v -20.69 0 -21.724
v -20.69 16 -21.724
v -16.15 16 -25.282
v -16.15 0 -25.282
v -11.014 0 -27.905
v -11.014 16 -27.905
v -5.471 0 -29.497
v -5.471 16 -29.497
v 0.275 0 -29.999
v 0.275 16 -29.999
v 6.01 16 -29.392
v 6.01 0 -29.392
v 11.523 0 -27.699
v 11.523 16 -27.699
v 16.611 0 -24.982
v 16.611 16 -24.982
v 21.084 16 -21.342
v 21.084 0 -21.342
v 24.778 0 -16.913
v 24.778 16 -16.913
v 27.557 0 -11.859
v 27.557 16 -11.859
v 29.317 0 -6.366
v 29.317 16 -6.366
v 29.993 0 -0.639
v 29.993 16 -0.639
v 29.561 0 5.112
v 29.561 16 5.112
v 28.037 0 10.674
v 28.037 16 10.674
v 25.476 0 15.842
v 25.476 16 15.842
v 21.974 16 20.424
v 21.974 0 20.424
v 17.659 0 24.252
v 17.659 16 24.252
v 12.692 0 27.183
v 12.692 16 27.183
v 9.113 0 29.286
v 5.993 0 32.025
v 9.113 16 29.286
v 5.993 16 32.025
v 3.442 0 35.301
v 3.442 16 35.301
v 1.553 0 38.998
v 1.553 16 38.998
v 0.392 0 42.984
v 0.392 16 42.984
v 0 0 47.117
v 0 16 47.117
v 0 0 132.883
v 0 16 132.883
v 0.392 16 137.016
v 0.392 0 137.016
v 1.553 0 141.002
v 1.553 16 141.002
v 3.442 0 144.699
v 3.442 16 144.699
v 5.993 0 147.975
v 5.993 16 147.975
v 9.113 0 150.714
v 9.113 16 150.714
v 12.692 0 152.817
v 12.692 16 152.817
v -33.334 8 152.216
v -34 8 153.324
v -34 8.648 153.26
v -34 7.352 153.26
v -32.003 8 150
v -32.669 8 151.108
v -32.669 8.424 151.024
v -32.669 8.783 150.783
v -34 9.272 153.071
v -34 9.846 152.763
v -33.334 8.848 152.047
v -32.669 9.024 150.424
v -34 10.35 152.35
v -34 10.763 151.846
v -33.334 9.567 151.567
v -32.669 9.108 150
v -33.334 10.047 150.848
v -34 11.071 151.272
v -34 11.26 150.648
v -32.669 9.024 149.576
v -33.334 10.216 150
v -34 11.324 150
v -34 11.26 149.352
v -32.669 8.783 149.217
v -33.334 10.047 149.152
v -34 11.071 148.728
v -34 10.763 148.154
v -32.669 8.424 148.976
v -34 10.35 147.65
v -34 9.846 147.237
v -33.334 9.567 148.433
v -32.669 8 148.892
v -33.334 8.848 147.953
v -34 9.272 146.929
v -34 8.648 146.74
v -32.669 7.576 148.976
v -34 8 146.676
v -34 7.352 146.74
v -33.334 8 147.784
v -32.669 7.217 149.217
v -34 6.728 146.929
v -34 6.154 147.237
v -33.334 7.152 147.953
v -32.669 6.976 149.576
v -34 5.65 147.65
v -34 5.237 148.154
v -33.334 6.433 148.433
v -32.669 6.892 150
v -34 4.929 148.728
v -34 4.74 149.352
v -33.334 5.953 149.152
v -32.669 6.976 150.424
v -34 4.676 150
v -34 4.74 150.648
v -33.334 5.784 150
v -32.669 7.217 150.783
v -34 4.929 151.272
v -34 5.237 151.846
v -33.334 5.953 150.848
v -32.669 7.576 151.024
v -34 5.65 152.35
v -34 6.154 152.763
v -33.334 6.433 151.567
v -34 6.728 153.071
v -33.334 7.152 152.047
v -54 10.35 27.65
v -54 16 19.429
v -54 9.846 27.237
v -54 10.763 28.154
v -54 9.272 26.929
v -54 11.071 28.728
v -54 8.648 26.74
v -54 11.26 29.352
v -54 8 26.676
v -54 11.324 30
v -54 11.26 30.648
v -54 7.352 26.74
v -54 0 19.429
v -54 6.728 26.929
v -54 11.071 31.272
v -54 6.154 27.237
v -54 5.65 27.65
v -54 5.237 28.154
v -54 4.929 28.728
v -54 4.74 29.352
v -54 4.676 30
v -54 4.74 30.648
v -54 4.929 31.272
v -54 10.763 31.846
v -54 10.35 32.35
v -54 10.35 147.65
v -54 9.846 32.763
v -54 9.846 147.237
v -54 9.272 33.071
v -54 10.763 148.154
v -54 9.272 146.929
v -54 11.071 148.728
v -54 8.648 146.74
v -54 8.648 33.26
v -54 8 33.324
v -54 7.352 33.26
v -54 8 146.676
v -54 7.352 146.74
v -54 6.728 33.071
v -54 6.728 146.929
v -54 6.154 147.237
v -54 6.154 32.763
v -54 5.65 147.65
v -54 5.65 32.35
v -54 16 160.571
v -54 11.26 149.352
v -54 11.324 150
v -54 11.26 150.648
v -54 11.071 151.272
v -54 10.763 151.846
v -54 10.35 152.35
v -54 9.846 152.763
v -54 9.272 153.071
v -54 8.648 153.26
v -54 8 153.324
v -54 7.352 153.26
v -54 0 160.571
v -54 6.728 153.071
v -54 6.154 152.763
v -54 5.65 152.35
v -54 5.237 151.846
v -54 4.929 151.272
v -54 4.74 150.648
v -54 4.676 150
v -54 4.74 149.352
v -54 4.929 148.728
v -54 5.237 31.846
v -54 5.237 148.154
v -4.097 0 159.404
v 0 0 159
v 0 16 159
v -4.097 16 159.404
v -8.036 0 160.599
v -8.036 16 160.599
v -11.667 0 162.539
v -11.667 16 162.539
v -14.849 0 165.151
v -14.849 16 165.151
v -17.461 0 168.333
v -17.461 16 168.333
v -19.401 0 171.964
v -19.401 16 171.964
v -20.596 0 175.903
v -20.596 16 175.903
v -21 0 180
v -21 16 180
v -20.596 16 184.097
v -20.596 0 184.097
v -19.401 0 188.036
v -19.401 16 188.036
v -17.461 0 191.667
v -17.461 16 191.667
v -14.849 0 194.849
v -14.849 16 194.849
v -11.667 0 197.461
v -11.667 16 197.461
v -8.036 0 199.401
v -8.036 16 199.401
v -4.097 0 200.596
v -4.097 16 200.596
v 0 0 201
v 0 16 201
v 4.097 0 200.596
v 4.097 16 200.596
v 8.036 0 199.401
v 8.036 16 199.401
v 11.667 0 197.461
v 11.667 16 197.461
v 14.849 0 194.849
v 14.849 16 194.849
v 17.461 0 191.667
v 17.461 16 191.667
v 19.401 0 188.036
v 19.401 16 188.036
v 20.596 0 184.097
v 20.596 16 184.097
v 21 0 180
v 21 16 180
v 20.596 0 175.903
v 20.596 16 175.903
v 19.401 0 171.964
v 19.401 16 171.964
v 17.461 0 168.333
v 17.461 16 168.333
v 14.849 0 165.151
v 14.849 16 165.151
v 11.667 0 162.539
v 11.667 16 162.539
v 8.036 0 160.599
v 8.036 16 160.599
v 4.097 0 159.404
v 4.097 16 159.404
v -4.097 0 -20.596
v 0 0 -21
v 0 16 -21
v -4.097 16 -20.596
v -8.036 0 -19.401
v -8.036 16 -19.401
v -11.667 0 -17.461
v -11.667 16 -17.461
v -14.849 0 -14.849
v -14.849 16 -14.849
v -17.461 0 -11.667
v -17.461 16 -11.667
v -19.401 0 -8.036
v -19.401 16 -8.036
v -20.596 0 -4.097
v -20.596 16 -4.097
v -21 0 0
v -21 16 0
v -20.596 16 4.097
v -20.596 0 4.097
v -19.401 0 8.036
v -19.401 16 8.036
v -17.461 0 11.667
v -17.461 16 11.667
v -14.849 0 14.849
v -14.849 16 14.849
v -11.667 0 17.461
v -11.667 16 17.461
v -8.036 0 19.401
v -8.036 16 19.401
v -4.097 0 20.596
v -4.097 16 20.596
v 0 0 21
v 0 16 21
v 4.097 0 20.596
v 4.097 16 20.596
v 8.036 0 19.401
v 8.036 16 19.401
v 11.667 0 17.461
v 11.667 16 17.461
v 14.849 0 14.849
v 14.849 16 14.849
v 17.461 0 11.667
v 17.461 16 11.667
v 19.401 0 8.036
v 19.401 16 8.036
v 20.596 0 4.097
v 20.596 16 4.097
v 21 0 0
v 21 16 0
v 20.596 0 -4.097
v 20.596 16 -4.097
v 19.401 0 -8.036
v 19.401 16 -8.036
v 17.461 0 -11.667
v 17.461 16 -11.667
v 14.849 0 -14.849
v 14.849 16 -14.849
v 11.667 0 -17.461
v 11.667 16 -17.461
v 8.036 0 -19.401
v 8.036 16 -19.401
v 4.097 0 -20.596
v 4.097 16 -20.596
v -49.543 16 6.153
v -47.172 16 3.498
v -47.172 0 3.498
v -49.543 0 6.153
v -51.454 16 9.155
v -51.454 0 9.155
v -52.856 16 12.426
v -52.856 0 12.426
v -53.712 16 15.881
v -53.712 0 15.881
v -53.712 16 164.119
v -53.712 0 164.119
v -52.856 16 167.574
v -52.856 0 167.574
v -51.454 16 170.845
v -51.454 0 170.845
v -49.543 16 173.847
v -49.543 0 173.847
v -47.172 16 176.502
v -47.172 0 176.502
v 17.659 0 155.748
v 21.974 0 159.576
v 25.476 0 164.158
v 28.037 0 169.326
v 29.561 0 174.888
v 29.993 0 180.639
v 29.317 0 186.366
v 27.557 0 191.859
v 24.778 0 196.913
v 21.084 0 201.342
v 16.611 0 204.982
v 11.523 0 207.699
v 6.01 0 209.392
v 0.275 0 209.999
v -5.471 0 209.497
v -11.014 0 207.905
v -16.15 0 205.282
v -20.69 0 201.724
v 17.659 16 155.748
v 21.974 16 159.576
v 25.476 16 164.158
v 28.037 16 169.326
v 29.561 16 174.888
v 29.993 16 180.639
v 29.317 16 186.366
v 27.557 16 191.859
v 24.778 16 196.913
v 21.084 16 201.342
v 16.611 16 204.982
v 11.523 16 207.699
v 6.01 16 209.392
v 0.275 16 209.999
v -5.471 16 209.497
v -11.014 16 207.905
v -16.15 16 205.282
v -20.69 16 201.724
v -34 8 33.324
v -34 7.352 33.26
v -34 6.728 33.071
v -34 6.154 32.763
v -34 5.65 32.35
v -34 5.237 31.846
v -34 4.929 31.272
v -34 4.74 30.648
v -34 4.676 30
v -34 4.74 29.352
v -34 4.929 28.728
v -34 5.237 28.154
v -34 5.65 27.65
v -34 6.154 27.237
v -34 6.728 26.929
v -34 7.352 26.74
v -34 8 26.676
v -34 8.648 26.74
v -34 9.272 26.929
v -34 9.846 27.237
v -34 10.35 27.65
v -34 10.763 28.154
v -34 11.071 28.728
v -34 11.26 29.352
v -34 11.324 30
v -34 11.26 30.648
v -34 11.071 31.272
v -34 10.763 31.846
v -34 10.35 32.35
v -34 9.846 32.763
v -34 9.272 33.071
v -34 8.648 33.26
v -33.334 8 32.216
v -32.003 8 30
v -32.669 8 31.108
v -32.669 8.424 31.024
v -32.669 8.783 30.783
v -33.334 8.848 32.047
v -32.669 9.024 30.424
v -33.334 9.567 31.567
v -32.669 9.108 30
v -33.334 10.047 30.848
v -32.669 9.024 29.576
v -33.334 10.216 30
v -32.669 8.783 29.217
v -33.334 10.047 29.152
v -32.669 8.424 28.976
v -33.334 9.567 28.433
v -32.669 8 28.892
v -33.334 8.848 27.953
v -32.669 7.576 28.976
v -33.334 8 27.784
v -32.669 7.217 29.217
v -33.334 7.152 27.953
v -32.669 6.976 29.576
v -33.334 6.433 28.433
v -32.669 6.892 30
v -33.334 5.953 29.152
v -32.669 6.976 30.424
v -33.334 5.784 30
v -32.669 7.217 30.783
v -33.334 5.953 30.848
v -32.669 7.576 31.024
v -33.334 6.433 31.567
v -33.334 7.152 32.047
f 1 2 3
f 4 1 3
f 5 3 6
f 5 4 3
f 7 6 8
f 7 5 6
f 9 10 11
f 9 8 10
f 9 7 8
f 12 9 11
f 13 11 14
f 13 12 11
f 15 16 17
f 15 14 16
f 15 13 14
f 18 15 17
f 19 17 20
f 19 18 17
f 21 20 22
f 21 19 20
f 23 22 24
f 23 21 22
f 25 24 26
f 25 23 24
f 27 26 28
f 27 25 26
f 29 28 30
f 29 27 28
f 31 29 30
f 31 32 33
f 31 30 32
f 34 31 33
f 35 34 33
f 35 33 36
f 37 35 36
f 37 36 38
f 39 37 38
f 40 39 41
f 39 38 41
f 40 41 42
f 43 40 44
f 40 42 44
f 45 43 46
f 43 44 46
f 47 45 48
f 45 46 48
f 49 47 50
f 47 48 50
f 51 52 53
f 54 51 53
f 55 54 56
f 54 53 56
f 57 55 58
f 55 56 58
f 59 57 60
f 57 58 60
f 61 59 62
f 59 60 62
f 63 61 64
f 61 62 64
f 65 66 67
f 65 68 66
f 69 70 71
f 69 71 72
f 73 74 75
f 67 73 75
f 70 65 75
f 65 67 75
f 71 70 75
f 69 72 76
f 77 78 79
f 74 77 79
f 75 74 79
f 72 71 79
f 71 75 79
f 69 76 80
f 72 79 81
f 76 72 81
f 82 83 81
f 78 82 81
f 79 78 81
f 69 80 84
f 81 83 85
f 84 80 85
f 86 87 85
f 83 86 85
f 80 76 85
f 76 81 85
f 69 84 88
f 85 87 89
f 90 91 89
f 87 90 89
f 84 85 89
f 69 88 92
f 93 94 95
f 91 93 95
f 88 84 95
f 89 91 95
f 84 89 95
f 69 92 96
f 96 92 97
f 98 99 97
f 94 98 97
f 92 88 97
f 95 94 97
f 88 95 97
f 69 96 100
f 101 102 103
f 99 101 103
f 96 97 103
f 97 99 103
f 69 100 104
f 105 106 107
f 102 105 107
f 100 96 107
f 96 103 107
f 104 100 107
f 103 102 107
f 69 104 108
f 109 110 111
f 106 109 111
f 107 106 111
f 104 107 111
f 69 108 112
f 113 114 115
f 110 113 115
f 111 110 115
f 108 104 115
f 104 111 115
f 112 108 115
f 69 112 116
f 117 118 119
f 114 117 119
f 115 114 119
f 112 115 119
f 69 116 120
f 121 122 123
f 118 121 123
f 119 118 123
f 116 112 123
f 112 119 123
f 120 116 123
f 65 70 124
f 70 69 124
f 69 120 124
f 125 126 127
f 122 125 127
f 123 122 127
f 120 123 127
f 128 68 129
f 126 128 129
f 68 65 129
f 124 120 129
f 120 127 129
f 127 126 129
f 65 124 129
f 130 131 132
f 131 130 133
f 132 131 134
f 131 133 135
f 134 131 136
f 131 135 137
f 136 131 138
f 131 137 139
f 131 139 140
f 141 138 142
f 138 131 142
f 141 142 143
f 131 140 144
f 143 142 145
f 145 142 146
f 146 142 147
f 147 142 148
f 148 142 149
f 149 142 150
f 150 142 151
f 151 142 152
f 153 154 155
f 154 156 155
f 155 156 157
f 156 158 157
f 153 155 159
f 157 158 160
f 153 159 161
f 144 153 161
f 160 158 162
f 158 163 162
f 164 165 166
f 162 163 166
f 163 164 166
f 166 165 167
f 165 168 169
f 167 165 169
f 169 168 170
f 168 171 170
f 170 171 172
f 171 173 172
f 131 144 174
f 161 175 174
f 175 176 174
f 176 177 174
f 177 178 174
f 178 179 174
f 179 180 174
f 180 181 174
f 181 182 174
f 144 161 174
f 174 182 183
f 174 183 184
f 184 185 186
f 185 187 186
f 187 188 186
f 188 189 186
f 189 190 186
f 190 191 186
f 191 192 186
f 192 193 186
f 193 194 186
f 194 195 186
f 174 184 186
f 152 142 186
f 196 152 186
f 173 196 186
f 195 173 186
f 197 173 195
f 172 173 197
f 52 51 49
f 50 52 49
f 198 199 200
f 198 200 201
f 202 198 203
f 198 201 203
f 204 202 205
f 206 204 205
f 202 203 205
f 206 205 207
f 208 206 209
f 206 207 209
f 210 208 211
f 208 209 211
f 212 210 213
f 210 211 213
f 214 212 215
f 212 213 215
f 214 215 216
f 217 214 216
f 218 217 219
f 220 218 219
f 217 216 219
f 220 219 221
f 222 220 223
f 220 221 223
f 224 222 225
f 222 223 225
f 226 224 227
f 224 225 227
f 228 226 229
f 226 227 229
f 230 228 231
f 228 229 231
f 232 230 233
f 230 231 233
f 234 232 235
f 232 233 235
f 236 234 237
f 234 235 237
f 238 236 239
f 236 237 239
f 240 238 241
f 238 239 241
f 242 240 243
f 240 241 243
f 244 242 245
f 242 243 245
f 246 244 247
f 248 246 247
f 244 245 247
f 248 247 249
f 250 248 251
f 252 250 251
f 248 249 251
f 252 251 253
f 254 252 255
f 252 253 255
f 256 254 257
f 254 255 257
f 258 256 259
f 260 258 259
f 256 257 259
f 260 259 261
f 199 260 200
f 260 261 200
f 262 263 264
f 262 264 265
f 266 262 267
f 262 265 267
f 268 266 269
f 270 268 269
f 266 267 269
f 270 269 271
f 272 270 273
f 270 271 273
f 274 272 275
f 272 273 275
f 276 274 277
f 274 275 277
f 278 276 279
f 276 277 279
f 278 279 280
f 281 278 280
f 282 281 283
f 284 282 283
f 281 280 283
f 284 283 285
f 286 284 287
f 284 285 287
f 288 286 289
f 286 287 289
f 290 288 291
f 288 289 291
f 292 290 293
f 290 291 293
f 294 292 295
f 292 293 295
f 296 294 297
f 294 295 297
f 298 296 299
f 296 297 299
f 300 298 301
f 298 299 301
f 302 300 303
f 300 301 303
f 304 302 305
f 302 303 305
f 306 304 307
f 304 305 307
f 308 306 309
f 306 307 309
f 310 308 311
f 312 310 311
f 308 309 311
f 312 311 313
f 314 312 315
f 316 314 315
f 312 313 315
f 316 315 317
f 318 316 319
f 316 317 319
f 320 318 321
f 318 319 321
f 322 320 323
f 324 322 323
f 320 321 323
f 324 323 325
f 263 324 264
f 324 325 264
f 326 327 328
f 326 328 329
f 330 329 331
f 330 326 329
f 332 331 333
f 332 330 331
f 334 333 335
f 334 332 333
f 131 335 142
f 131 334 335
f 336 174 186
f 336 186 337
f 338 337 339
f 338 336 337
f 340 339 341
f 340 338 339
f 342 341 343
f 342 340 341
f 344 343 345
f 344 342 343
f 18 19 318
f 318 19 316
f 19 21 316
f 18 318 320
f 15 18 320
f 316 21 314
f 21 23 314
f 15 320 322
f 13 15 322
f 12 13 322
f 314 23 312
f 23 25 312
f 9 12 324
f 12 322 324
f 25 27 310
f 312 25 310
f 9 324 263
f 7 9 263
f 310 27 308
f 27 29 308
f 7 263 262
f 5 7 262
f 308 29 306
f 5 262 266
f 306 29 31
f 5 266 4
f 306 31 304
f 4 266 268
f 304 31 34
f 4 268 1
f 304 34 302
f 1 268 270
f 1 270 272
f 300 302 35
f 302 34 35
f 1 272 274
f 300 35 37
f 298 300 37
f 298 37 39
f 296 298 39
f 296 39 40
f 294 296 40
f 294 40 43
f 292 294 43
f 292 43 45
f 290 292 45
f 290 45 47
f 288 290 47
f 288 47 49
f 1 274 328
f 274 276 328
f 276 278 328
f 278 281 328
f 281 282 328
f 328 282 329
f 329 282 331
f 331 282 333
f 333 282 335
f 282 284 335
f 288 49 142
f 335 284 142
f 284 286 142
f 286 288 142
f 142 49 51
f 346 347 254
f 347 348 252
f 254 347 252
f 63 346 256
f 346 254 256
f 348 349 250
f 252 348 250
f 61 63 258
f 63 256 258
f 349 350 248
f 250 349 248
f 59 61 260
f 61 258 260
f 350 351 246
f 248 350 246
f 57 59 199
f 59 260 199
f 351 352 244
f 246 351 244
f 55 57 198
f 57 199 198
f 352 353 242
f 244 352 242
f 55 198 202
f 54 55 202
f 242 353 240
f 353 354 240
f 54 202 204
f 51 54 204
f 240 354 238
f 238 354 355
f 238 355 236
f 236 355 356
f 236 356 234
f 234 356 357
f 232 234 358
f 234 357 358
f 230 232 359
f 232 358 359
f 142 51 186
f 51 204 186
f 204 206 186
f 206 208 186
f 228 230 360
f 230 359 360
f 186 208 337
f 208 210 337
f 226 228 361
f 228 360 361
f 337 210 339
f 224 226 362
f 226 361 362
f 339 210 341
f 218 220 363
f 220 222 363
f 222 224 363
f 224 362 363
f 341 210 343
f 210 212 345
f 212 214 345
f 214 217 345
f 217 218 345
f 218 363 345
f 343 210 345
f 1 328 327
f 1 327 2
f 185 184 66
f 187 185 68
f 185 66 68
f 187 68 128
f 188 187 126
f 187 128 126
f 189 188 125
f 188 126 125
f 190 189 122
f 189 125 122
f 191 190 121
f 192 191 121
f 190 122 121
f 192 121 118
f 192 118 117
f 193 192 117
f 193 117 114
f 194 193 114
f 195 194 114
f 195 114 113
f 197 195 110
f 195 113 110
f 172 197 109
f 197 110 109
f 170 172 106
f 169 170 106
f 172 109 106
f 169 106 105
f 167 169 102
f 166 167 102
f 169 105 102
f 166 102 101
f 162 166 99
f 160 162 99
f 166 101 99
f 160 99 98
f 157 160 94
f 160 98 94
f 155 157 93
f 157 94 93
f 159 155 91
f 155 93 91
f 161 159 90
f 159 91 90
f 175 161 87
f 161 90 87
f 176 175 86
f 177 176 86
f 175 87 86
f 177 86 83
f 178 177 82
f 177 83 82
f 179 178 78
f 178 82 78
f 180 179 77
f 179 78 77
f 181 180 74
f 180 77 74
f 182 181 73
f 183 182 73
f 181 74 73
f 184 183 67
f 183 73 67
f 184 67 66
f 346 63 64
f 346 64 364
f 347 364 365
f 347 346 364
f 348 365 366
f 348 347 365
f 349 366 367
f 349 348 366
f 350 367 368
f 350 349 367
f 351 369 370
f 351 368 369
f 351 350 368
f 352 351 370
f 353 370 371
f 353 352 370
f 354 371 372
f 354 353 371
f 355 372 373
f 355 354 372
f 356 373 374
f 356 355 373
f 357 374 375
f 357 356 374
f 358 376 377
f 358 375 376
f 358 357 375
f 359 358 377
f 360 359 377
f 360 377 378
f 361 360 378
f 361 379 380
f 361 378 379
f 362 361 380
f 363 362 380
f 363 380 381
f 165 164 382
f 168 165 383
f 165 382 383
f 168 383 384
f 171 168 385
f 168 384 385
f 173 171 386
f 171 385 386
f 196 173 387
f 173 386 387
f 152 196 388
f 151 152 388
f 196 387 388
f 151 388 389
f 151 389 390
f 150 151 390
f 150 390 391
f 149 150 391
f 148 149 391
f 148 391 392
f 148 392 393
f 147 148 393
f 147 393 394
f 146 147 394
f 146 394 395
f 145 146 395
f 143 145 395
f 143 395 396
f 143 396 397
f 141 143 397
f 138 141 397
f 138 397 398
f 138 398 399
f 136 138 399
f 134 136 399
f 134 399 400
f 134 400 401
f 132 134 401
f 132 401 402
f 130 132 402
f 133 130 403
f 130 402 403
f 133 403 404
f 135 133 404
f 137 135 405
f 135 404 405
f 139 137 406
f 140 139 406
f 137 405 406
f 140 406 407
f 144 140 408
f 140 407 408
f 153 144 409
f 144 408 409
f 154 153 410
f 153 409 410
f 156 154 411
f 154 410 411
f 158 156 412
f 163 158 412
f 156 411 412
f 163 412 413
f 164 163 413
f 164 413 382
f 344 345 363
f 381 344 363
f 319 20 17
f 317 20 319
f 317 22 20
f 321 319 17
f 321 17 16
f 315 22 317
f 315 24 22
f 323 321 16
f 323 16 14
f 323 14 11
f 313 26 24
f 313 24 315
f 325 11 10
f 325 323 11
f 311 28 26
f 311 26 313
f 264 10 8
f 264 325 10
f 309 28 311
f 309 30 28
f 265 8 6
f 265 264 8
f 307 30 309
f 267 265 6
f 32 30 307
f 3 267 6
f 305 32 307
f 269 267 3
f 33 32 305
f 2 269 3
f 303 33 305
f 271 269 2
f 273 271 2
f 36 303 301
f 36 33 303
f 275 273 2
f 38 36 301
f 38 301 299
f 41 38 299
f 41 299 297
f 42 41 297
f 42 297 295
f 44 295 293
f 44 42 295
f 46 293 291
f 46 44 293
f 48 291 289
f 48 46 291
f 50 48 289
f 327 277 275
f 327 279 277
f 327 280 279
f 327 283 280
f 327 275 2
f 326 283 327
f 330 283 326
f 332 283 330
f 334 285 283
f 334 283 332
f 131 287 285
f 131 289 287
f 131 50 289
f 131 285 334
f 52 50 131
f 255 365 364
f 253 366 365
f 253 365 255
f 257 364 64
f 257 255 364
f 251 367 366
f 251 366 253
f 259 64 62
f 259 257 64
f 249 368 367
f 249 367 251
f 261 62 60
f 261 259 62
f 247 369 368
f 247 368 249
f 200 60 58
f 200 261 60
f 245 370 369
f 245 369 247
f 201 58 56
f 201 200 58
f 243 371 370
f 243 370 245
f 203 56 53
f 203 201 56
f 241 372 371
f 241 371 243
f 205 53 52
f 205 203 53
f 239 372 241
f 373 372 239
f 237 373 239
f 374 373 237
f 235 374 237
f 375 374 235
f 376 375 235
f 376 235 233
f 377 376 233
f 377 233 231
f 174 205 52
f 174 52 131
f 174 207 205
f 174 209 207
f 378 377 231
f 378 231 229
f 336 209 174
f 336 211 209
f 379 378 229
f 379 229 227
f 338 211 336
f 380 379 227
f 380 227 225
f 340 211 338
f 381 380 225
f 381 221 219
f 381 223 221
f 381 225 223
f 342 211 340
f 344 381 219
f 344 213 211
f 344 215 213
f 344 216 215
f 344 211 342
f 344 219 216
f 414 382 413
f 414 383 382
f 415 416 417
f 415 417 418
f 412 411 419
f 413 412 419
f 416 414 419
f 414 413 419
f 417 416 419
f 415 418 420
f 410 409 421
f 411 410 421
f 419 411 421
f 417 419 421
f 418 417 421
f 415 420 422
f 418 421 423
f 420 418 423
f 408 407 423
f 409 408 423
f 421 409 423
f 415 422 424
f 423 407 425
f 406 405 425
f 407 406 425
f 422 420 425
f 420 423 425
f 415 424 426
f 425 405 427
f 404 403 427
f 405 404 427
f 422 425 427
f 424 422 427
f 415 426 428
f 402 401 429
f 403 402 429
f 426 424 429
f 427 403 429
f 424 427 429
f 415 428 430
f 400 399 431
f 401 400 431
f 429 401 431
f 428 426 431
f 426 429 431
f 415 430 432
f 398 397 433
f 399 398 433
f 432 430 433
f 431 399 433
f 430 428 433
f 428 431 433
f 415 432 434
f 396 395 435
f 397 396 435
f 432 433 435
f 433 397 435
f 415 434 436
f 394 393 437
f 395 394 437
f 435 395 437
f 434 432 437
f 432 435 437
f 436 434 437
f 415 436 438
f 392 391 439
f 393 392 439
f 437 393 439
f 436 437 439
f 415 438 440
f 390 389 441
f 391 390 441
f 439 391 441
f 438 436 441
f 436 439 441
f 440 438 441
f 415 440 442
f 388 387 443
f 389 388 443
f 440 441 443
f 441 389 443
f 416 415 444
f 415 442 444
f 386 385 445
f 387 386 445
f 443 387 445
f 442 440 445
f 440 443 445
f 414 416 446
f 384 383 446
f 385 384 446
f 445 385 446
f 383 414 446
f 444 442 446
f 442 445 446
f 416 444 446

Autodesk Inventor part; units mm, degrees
ref_plane "YZ Plane" through (0, 0, 0) normal (1, 0, 0) x (0, 1, 0)
ref_plane "XZ Plane" through (0, 0, 0) normal (0, 1, 0) x (-1, 0, 0)
ref_plane "XY Plane" through (0, 0, 0) normal (0, 0, 1) x (1, 0, 0)
sketch "Sketch1" plane through (0, 0, 0) normal (0, 1, 0) x (-1, 0, 0)
  arc A0 (0, 30) -> (20.6897, -21.7241) centre (0, 0) ccw
  arc A1 (20.6897, 201.7241) -> (0, 150) centre (0, 180) ccw
  line L0 (54, 10) -> (54, 170)
  line L1 (0, 150) -> (0, 30)
  line L2 (54, 10) -> (20.6897, -21.7241)
  line L3 (54, 170) -> (20.6897, 201.7241)
extrude "Extrusion2" add sketch "Sketch1" along normal blind 16
hole "Hole3" at (0, 0, 180) at (0, 0, 0) direction (0, 1, 0) diameter 42 depth 16
fillet "Fillet3" radius 22 2 edges at (0, 8, 30) (0, 8, 150)
sketch "Sketch4" plane through (-54, 0, 10) normal (-1, 0, 0) x (0, 0, 1)
  line L0 (0, 0) -> (0, 16) projected
  line L1 (0, 8) -> (160, 8)
  line L2 (160, 0) -> (160, 16) projected
  point P0 (-10, 0)
  point P1 (20, 8)
  point P2 (140, 8)
fillet "Fillet4" radius 22 2 edges at (-54, 8, 10) (-54, 8, 170)
hole "Hole4" at (-54, 8, 30) at (-54, 8, 150) direction (1, 0, 0) diameter 6.647 depth 20 tip angle 118 thread size "M8x1.25" class "6H" standard "ISO Metric profile"
properties part number "TelescopeMountConnector"
